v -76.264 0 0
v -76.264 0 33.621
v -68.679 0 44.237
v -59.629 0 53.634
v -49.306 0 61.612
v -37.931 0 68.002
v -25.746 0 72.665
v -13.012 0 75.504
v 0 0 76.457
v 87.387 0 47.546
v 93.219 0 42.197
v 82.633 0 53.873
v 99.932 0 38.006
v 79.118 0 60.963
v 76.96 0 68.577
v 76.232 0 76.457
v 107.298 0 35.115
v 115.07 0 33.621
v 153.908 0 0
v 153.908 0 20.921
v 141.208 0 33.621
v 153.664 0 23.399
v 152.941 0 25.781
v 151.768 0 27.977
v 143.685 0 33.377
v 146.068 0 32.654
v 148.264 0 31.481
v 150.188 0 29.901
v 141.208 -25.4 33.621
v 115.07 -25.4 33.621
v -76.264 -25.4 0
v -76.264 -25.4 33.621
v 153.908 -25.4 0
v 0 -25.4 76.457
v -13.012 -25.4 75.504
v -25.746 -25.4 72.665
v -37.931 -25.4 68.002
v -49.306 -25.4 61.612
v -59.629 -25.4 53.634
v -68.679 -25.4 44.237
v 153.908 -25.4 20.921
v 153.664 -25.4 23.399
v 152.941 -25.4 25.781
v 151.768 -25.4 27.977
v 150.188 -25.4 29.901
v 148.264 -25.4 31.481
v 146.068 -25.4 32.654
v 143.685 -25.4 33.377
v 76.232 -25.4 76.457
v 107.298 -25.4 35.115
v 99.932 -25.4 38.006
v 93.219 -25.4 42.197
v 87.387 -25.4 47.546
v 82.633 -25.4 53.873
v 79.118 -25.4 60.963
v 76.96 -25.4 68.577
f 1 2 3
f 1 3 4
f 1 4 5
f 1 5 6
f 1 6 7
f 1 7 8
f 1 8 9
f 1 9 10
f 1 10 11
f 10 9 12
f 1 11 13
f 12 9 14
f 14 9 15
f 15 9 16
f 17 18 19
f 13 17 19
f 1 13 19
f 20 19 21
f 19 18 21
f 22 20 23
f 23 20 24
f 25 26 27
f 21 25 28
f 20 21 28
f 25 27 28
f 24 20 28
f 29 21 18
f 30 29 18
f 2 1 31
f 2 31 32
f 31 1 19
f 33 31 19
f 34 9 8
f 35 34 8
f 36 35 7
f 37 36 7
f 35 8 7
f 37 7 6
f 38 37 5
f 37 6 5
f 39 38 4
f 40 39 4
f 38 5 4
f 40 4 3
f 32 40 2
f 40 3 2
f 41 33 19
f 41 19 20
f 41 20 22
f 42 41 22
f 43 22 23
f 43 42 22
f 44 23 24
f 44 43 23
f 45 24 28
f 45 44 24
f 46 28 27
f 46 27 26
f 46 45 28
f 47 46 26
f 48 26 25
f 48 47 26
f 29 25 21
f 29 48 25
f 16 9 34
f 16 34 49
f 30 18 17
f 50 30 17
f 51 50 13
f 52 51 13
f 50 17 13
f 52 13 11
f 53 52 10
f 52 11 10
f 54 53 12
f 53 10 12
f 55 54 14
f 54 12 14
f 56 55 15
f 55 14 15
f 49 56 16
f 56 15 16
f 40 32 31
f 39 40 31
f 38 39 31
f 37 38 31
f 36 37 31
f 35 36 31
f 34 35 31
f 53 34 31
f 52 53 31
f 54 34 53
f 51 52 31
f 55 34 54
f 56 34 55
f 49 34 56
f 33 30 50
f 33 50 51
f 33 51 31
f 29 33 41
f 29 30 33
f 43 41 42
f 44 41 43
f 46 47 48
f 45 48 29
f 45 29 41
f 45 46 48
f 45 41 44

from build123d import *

# Parameters (mm, degrees)
F0_W     = 76.2637332082
F0_H     = 33.6211510003
F0_W_2   = 76.2320831418
F0_H_2   = 42.8359024227
F1_DEPTH = 25.4
F2_R     = 12.7


with BuildPart() as f1:
    # F0 (on Front) → F1 (new body)
    with BuildSketch(Plane.XZ):
        with BuildLine():
            Line((-76.2637332082, 33.6211510003), (0, 33.6211510003))
            Line((0, 33.6211510003), (0, 76.4570534229))
            ThreePointArc((0, 76.4570534229), (-43.7352018951, 65.015109335), (-76.2637332082, 33.6211510003))
        make_face()
        with Locations((-38.1318666041, 16.8105755001)):
            Rectangle(F0_W, F0_H)
        with Locations((38.1160415709, 16.8105755001)):
            Rectangle(F0_W_2, F0_H)
        with Locations((38.1160415709, 55.0391022116)):
            Rectangle(F0_W_2, F0_H_2)
        Polygon((76.2320831418, 33.6211510003), (76.2320831418, 0), (153.9078503847, 0), (153.9078503847, 33.6211510003), (115.0699667633, 33.6211510003), align=None)
        with BuildLine():
            Line((76.2320831418, 76.4570534229), (76.2320831418, 33.6211510003))
            Line((76.2320831418, 33.6211510003), (115.0699667633, 33.6211510003))
            ThreePointArc((115.0699667633, 33.6211510003), (87.3870520199, 47.5464336589), (76.2320831418, 76.4570534229))
        make_face()
    extrude(amount=F1_DEPTH)

    # F2
    f2_edges = [f1.edges().sort_by_distance(p)[0] for p in [
        (153.90785, -12.7, 33.621151),
    ]]
    fillet(f2_edges, radius=F2_R)


solid = f1.part
